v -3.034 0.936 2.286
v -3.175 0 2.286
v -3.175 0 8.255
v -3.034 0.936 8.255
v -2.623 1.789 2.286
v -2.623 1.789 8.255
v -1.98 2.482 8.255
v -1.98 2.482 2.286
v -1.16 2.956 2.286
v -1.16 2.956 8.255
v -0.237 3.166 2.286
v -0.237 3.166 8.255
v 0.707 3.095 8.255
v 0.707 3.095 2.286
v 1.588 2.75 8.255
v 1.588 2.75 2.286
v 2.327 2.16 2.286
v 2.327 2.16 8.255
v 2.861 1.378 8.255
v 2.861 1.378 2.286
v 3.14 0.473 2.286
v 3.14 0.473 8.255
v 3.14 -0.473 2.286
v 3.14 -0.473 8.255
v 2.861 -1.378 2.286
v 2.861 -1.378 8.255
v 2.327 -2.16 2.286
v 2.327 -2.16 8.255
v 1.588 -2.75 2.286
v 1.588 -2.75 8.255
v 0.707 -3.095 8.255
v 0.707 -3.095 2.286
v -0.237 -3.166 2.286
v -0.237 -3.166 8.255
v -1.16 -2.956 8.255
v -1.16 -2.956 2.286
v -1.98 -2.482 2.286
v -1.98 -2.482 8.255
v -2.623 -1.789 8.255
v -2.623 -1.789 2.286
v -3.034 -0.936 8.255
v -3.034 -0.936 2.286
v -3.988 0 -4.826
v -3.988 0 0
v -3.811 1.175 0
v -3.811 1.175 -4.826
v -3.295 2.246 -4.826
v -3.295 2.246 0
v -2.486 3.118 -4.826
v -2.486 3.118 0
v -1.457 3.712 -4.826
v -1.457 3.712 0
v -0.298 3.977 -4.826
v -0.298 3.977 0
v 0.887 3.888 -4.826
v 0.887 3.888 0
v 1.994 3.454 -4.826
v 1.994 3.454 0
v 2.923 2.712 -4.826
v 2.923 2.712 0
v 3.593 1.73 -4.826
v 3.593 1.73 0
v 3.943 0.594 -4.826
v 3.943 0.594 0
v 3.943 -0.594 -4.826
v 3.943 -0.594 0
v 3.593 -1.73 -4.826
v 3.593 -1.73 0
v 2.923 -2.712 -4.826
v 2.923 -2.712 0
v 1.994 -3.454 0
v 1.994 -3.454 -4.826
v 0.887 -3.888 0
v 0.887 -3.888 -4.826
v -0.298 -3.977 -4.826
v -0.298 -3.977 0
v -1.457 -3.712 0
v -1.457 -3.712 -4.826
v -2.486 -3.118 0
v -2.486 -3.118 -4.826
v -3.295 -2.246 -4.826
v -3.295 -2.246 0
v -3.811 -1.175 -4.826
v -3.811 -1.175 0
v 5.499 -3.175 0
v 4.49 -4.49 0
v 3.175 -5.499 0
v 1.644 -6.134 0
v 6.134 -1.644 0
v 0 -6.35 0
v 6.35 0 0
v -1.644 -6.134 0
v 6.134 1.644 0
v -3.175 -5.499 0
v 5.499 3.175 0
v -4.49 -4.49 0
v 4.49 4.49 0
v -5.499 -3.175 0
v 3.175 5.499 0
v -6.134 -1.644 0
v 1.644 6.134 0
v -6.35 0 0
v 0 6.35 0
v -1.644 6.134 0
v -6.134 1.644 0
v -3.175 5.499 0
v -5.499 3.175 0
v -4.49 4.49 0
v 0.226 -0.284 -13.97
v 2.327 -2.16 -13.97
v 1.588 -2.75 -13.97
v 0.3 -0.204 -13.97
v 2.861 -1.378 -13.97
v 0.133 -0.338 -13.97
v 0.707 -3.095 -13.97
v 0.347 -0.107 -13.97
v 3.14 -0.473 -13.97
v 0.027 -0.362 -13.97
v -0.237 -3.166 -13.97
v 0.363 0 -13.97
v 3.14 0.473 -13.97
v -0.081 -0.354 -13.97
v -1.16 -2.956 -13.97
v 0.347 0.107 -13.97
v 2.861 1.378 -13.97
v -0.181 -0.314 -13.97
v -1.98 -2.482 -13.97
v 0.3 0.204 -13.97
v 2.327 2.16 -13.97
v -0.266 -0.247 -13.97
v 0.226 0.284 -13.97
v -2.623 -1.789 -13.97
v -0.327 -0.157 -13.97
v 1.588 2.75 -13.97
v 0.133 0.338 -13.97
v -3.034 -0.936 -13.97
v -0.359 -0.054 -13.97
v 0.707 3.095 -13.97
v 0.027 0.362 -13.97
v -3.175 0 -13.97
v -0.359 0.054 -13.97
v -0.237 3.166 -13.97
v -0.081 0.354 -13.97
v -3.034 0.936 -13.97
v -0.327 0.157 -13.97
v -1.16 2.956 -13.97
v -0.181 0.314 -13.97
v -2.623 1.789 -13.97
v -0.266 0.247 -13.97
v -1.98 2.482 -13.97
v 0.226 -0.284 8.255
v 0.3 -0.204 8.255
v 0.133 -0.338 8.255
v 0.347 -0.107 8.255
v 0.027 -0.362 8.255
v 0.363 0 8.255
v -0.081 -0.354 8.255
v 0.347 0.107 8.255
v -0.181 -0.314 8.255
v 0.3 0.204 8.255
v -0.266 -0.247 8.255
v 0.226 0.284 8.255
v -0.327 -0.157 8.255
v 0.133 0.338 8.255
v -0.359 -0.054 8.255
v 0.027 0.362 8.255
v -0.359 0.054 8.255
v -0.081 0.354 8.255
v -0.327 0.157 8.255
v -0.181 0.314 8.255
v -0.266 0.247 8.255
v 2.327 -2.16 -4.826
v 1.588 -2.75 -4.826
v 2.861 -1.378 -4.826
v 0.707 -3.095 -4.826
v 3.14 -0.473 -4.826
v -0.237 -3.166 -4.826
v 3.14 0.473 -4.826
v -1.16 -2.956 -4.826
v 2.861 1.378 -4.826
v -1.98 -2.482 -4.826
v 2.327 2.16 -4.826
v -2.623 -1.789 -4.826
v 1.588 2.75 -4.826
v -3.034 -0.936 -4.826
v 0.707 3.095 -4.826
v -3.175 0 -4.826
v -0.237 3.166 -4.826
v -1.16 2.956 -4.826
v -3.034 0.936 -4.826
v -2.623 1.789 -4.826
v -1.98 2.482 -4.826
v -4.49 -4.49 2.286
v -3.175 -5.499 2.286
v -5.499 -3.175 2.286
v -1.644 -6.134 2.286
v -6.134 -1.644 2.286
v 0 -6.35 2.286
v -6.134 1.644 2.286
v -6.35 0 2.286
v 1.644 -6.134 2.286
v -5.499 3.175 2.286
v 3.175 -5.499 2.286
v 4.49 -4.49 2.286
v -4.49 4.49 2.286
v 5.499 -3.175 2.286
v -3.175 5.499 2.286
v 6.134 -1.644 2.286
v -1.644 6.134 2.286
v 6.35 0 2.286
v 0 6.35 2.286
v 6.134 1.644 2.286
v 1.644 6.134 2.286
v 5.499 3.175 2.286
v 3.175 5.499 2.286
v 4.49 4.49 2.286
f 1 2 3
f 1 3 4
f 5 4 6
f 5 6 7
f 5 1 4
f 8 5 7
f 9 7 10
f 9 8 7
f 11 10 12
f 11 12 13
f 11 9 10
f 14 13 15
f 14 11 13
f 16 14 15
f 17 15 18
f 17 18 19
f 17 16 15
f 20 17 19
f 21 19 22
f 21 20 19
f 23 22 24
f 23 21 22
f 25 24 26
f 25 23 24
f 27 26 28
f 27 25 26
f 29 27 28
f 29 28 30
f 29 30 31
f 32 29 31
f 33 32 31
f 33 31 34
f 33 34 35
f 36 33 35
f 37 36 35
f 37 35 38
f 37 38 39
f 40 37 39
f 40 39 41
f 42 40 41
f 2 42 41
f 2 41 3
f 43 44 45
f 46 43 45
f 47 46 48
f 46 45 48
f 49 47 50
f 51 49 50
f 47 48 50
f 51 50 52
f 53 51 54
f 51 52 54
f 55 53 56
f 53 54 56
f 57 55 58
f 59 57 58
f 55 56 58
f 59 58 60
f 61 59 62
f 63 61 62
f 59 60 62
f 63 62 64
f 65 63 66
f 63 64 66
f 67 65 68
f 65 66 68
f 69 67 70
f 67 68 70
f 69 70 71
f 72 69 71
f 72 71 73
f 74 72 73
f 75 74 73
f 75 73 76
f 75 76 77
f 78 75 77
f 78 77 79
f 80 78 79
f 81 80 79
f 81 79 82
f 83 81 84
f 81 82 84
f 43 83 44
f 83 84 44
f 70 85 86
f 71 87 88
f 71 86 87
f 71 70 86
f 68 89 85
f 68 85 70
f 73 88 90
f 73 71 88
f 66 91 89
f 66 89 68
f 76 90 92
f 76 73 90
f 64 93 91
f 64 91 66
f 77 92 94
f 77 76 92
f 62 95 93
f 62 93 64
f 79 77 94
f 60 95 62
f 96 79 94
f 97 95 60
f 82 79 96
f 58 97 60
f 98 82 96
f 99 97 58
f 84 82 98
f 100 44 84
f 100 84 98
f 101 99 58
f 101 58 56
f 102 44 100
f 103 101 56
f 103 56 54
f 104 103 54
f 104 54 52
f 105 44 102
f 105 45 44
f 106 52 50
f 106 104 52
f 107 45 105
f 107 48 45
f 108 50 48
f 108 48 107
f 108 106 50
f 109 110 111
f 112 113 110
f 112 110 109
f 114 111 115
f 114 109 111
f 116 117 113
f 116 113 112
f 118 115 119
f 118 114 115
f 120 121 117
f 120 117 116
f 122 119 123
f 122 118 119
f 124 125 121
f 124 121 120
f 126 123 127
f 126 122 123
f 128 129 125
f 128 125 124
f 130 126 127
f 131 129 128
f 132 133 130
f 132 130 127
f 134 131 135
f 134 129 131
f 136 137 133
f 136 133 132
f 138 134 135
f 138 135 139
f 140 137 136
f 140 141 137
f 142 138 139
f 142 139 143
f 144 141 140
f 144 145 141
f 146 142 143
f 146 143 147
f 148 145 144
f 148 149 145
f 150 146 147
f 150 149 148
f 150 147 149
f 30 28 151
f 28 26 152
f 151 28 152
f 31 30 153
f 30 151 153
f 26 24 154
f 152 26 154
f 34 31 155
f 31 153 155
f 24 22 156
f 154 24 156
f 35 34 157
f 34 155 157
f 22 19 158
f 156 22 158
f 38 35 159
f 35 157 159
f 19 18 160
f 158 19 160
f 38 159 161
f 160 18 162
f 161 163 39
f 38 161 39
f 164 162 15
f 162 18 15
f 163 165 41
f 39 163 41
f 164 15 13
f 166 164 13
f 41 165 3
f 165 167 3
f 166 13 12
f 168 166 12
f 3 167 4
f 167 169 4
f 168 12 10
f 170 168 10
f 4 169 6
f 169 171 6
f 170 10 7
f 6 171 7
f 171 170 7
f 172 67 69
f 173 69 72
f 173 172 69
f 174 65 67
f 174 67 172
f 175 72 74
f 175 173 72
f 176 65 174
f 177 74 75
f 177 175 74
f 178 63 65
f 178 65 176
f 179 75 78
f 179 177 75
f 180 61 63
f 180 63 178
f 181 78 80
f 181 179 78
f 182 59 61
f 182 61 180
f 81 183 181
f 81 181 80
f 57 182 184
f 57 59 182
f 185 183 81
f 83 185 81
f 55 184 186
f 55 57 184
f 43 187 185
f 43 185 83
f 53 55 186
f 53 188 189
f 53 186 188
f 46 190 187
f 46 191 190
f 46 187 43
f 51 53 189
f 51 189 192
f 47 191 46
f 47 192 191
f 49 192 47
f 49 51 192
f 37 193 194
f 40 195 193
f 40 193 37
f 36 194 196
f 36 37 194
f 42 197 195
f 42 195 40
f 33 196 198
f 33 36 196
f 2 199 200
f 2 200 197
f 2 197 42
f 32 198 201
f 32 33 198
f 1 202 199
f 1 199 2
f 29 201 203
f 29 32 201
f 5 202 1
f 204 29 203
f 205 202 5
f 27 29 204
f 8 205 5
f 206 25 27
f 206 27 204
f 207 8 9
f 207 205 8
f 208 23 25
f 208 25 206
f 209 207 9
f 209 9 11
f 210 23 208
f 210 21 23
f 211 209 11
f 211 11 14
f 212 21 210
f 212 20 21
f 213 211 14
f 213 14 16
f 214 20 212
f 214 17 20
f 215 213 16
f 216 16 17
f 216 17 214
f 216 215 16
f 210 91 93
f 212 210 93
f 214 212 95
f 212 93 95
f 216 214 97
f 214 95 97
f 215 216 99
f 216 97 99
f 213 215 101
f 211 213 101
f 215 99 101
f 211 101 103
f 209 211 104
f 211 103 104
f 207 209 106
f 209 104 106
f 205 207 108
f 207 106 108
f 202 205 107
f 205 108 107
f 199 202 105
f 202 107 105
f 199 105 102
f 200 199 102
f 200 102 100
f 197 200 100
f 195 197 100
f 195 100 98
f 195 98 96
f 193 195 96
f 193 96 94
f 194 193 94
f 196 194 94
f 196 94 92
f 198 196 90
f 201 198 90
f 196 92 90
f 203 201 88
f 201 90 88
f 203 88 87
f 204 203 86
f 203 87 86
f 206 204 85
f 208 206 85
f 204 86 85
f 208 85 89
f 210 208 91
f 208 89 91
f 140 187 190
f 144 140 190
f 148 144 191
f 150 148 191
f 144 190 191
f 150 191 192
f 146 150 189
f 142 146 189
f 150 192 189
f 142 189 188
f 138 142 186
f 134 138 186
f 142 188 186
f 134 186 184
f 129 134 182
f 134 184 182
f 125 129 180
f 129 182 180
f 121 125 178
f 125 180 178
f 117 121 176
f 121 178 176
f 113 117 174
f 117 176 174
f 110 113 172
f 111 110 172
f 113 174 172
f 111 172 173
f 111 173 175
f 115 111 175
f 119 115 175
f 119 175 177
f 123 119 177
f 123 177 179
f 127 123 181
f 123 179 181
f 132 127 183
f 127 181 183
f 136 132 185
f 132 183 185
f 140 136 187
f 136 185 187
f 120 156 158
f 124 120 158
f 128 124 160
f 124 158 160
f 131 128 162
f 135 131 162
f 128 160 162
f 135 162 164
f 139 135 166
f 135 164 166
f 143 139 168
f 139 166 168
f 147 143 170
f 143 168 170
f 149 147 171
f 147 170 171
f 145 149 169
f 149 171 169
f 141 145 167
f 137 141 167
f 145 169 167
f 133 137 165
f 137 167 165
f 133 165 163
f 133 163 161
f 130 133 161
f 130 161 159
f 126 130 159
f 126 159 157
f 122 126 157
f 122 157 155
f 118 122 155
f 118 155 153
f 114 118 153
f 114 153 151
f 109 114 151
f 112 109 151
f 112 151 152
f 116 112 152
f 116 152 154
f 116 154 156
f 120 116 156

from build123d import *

# Parameters (mm, degrees)
SKETCH1_R           = 6.35
BOSS_EXTRUDE1_DEPTH = 2.286
SKETCH2_R           = 3.175
BOSS_EXTRUDE2_DEPTH = 8.255
SKETCH3_R           = 3.9878
BOSS_EXTRUDE3_DEPTH = 4.826
SKETCH4_R           = 3.175
BOSS_EXTRUDE4_DEPTH = 9.144
SKETCH5_R           = 0.362927277
CUT_EXTRUDE1_DEPTH  = 23.225


with BuildPart() as part:
    # Sketch1 → Boss-Extrude1 (new body)
    with BuildSketch(Plane.XY):
        Circle(SKETCH1_R)
    extrude(amount=BOSS_EXTRUDE1_DEPTH)

    # Sketch2 → Boss-Extrude2 (add)
    with BuildSketch(Plane(origin=(0, 0, 0), x_dir=(-1, 0, 0), z_dir=(0, 0, -1))):
        Circle(SKETCH2_R)
    extrude(amount=-BOSS_EXTRUDE2_DEPTH)

    # Sketch3 → Boss-Extrude3 (add)
    with BuildSketch(Plane(origin=(0, 0, 0), x_dir=(-1, 0, 0), z_dir=(0, 0, -1))):
        Circle(SKETCH3_R)
    extrude(amount=BOSS_EXTRUDE3_DEPTH)

    # Sketch4 → Boss-Extrude4 (add)
    with BuildSketch(Plane(origin=(0, 0, -4.826), x_dir=(-1, 0, 0), z_dir=(0, 0, -1))):
        Circle(SKETCH4_R)
    extrude(amount=BOSS_EXTRUDE4_DEPTH)

    # Sketch5 → Cut-Extrude1 (cut, through all)
    with BuildSketch(Plane.XY.offset(8.255)):
        Circle(SKETCH5_R)
    extrude(amount=-CUT_EXTRUDE1_DEPTH, mode=Mode.SUBTRACT)


solid = part.part
